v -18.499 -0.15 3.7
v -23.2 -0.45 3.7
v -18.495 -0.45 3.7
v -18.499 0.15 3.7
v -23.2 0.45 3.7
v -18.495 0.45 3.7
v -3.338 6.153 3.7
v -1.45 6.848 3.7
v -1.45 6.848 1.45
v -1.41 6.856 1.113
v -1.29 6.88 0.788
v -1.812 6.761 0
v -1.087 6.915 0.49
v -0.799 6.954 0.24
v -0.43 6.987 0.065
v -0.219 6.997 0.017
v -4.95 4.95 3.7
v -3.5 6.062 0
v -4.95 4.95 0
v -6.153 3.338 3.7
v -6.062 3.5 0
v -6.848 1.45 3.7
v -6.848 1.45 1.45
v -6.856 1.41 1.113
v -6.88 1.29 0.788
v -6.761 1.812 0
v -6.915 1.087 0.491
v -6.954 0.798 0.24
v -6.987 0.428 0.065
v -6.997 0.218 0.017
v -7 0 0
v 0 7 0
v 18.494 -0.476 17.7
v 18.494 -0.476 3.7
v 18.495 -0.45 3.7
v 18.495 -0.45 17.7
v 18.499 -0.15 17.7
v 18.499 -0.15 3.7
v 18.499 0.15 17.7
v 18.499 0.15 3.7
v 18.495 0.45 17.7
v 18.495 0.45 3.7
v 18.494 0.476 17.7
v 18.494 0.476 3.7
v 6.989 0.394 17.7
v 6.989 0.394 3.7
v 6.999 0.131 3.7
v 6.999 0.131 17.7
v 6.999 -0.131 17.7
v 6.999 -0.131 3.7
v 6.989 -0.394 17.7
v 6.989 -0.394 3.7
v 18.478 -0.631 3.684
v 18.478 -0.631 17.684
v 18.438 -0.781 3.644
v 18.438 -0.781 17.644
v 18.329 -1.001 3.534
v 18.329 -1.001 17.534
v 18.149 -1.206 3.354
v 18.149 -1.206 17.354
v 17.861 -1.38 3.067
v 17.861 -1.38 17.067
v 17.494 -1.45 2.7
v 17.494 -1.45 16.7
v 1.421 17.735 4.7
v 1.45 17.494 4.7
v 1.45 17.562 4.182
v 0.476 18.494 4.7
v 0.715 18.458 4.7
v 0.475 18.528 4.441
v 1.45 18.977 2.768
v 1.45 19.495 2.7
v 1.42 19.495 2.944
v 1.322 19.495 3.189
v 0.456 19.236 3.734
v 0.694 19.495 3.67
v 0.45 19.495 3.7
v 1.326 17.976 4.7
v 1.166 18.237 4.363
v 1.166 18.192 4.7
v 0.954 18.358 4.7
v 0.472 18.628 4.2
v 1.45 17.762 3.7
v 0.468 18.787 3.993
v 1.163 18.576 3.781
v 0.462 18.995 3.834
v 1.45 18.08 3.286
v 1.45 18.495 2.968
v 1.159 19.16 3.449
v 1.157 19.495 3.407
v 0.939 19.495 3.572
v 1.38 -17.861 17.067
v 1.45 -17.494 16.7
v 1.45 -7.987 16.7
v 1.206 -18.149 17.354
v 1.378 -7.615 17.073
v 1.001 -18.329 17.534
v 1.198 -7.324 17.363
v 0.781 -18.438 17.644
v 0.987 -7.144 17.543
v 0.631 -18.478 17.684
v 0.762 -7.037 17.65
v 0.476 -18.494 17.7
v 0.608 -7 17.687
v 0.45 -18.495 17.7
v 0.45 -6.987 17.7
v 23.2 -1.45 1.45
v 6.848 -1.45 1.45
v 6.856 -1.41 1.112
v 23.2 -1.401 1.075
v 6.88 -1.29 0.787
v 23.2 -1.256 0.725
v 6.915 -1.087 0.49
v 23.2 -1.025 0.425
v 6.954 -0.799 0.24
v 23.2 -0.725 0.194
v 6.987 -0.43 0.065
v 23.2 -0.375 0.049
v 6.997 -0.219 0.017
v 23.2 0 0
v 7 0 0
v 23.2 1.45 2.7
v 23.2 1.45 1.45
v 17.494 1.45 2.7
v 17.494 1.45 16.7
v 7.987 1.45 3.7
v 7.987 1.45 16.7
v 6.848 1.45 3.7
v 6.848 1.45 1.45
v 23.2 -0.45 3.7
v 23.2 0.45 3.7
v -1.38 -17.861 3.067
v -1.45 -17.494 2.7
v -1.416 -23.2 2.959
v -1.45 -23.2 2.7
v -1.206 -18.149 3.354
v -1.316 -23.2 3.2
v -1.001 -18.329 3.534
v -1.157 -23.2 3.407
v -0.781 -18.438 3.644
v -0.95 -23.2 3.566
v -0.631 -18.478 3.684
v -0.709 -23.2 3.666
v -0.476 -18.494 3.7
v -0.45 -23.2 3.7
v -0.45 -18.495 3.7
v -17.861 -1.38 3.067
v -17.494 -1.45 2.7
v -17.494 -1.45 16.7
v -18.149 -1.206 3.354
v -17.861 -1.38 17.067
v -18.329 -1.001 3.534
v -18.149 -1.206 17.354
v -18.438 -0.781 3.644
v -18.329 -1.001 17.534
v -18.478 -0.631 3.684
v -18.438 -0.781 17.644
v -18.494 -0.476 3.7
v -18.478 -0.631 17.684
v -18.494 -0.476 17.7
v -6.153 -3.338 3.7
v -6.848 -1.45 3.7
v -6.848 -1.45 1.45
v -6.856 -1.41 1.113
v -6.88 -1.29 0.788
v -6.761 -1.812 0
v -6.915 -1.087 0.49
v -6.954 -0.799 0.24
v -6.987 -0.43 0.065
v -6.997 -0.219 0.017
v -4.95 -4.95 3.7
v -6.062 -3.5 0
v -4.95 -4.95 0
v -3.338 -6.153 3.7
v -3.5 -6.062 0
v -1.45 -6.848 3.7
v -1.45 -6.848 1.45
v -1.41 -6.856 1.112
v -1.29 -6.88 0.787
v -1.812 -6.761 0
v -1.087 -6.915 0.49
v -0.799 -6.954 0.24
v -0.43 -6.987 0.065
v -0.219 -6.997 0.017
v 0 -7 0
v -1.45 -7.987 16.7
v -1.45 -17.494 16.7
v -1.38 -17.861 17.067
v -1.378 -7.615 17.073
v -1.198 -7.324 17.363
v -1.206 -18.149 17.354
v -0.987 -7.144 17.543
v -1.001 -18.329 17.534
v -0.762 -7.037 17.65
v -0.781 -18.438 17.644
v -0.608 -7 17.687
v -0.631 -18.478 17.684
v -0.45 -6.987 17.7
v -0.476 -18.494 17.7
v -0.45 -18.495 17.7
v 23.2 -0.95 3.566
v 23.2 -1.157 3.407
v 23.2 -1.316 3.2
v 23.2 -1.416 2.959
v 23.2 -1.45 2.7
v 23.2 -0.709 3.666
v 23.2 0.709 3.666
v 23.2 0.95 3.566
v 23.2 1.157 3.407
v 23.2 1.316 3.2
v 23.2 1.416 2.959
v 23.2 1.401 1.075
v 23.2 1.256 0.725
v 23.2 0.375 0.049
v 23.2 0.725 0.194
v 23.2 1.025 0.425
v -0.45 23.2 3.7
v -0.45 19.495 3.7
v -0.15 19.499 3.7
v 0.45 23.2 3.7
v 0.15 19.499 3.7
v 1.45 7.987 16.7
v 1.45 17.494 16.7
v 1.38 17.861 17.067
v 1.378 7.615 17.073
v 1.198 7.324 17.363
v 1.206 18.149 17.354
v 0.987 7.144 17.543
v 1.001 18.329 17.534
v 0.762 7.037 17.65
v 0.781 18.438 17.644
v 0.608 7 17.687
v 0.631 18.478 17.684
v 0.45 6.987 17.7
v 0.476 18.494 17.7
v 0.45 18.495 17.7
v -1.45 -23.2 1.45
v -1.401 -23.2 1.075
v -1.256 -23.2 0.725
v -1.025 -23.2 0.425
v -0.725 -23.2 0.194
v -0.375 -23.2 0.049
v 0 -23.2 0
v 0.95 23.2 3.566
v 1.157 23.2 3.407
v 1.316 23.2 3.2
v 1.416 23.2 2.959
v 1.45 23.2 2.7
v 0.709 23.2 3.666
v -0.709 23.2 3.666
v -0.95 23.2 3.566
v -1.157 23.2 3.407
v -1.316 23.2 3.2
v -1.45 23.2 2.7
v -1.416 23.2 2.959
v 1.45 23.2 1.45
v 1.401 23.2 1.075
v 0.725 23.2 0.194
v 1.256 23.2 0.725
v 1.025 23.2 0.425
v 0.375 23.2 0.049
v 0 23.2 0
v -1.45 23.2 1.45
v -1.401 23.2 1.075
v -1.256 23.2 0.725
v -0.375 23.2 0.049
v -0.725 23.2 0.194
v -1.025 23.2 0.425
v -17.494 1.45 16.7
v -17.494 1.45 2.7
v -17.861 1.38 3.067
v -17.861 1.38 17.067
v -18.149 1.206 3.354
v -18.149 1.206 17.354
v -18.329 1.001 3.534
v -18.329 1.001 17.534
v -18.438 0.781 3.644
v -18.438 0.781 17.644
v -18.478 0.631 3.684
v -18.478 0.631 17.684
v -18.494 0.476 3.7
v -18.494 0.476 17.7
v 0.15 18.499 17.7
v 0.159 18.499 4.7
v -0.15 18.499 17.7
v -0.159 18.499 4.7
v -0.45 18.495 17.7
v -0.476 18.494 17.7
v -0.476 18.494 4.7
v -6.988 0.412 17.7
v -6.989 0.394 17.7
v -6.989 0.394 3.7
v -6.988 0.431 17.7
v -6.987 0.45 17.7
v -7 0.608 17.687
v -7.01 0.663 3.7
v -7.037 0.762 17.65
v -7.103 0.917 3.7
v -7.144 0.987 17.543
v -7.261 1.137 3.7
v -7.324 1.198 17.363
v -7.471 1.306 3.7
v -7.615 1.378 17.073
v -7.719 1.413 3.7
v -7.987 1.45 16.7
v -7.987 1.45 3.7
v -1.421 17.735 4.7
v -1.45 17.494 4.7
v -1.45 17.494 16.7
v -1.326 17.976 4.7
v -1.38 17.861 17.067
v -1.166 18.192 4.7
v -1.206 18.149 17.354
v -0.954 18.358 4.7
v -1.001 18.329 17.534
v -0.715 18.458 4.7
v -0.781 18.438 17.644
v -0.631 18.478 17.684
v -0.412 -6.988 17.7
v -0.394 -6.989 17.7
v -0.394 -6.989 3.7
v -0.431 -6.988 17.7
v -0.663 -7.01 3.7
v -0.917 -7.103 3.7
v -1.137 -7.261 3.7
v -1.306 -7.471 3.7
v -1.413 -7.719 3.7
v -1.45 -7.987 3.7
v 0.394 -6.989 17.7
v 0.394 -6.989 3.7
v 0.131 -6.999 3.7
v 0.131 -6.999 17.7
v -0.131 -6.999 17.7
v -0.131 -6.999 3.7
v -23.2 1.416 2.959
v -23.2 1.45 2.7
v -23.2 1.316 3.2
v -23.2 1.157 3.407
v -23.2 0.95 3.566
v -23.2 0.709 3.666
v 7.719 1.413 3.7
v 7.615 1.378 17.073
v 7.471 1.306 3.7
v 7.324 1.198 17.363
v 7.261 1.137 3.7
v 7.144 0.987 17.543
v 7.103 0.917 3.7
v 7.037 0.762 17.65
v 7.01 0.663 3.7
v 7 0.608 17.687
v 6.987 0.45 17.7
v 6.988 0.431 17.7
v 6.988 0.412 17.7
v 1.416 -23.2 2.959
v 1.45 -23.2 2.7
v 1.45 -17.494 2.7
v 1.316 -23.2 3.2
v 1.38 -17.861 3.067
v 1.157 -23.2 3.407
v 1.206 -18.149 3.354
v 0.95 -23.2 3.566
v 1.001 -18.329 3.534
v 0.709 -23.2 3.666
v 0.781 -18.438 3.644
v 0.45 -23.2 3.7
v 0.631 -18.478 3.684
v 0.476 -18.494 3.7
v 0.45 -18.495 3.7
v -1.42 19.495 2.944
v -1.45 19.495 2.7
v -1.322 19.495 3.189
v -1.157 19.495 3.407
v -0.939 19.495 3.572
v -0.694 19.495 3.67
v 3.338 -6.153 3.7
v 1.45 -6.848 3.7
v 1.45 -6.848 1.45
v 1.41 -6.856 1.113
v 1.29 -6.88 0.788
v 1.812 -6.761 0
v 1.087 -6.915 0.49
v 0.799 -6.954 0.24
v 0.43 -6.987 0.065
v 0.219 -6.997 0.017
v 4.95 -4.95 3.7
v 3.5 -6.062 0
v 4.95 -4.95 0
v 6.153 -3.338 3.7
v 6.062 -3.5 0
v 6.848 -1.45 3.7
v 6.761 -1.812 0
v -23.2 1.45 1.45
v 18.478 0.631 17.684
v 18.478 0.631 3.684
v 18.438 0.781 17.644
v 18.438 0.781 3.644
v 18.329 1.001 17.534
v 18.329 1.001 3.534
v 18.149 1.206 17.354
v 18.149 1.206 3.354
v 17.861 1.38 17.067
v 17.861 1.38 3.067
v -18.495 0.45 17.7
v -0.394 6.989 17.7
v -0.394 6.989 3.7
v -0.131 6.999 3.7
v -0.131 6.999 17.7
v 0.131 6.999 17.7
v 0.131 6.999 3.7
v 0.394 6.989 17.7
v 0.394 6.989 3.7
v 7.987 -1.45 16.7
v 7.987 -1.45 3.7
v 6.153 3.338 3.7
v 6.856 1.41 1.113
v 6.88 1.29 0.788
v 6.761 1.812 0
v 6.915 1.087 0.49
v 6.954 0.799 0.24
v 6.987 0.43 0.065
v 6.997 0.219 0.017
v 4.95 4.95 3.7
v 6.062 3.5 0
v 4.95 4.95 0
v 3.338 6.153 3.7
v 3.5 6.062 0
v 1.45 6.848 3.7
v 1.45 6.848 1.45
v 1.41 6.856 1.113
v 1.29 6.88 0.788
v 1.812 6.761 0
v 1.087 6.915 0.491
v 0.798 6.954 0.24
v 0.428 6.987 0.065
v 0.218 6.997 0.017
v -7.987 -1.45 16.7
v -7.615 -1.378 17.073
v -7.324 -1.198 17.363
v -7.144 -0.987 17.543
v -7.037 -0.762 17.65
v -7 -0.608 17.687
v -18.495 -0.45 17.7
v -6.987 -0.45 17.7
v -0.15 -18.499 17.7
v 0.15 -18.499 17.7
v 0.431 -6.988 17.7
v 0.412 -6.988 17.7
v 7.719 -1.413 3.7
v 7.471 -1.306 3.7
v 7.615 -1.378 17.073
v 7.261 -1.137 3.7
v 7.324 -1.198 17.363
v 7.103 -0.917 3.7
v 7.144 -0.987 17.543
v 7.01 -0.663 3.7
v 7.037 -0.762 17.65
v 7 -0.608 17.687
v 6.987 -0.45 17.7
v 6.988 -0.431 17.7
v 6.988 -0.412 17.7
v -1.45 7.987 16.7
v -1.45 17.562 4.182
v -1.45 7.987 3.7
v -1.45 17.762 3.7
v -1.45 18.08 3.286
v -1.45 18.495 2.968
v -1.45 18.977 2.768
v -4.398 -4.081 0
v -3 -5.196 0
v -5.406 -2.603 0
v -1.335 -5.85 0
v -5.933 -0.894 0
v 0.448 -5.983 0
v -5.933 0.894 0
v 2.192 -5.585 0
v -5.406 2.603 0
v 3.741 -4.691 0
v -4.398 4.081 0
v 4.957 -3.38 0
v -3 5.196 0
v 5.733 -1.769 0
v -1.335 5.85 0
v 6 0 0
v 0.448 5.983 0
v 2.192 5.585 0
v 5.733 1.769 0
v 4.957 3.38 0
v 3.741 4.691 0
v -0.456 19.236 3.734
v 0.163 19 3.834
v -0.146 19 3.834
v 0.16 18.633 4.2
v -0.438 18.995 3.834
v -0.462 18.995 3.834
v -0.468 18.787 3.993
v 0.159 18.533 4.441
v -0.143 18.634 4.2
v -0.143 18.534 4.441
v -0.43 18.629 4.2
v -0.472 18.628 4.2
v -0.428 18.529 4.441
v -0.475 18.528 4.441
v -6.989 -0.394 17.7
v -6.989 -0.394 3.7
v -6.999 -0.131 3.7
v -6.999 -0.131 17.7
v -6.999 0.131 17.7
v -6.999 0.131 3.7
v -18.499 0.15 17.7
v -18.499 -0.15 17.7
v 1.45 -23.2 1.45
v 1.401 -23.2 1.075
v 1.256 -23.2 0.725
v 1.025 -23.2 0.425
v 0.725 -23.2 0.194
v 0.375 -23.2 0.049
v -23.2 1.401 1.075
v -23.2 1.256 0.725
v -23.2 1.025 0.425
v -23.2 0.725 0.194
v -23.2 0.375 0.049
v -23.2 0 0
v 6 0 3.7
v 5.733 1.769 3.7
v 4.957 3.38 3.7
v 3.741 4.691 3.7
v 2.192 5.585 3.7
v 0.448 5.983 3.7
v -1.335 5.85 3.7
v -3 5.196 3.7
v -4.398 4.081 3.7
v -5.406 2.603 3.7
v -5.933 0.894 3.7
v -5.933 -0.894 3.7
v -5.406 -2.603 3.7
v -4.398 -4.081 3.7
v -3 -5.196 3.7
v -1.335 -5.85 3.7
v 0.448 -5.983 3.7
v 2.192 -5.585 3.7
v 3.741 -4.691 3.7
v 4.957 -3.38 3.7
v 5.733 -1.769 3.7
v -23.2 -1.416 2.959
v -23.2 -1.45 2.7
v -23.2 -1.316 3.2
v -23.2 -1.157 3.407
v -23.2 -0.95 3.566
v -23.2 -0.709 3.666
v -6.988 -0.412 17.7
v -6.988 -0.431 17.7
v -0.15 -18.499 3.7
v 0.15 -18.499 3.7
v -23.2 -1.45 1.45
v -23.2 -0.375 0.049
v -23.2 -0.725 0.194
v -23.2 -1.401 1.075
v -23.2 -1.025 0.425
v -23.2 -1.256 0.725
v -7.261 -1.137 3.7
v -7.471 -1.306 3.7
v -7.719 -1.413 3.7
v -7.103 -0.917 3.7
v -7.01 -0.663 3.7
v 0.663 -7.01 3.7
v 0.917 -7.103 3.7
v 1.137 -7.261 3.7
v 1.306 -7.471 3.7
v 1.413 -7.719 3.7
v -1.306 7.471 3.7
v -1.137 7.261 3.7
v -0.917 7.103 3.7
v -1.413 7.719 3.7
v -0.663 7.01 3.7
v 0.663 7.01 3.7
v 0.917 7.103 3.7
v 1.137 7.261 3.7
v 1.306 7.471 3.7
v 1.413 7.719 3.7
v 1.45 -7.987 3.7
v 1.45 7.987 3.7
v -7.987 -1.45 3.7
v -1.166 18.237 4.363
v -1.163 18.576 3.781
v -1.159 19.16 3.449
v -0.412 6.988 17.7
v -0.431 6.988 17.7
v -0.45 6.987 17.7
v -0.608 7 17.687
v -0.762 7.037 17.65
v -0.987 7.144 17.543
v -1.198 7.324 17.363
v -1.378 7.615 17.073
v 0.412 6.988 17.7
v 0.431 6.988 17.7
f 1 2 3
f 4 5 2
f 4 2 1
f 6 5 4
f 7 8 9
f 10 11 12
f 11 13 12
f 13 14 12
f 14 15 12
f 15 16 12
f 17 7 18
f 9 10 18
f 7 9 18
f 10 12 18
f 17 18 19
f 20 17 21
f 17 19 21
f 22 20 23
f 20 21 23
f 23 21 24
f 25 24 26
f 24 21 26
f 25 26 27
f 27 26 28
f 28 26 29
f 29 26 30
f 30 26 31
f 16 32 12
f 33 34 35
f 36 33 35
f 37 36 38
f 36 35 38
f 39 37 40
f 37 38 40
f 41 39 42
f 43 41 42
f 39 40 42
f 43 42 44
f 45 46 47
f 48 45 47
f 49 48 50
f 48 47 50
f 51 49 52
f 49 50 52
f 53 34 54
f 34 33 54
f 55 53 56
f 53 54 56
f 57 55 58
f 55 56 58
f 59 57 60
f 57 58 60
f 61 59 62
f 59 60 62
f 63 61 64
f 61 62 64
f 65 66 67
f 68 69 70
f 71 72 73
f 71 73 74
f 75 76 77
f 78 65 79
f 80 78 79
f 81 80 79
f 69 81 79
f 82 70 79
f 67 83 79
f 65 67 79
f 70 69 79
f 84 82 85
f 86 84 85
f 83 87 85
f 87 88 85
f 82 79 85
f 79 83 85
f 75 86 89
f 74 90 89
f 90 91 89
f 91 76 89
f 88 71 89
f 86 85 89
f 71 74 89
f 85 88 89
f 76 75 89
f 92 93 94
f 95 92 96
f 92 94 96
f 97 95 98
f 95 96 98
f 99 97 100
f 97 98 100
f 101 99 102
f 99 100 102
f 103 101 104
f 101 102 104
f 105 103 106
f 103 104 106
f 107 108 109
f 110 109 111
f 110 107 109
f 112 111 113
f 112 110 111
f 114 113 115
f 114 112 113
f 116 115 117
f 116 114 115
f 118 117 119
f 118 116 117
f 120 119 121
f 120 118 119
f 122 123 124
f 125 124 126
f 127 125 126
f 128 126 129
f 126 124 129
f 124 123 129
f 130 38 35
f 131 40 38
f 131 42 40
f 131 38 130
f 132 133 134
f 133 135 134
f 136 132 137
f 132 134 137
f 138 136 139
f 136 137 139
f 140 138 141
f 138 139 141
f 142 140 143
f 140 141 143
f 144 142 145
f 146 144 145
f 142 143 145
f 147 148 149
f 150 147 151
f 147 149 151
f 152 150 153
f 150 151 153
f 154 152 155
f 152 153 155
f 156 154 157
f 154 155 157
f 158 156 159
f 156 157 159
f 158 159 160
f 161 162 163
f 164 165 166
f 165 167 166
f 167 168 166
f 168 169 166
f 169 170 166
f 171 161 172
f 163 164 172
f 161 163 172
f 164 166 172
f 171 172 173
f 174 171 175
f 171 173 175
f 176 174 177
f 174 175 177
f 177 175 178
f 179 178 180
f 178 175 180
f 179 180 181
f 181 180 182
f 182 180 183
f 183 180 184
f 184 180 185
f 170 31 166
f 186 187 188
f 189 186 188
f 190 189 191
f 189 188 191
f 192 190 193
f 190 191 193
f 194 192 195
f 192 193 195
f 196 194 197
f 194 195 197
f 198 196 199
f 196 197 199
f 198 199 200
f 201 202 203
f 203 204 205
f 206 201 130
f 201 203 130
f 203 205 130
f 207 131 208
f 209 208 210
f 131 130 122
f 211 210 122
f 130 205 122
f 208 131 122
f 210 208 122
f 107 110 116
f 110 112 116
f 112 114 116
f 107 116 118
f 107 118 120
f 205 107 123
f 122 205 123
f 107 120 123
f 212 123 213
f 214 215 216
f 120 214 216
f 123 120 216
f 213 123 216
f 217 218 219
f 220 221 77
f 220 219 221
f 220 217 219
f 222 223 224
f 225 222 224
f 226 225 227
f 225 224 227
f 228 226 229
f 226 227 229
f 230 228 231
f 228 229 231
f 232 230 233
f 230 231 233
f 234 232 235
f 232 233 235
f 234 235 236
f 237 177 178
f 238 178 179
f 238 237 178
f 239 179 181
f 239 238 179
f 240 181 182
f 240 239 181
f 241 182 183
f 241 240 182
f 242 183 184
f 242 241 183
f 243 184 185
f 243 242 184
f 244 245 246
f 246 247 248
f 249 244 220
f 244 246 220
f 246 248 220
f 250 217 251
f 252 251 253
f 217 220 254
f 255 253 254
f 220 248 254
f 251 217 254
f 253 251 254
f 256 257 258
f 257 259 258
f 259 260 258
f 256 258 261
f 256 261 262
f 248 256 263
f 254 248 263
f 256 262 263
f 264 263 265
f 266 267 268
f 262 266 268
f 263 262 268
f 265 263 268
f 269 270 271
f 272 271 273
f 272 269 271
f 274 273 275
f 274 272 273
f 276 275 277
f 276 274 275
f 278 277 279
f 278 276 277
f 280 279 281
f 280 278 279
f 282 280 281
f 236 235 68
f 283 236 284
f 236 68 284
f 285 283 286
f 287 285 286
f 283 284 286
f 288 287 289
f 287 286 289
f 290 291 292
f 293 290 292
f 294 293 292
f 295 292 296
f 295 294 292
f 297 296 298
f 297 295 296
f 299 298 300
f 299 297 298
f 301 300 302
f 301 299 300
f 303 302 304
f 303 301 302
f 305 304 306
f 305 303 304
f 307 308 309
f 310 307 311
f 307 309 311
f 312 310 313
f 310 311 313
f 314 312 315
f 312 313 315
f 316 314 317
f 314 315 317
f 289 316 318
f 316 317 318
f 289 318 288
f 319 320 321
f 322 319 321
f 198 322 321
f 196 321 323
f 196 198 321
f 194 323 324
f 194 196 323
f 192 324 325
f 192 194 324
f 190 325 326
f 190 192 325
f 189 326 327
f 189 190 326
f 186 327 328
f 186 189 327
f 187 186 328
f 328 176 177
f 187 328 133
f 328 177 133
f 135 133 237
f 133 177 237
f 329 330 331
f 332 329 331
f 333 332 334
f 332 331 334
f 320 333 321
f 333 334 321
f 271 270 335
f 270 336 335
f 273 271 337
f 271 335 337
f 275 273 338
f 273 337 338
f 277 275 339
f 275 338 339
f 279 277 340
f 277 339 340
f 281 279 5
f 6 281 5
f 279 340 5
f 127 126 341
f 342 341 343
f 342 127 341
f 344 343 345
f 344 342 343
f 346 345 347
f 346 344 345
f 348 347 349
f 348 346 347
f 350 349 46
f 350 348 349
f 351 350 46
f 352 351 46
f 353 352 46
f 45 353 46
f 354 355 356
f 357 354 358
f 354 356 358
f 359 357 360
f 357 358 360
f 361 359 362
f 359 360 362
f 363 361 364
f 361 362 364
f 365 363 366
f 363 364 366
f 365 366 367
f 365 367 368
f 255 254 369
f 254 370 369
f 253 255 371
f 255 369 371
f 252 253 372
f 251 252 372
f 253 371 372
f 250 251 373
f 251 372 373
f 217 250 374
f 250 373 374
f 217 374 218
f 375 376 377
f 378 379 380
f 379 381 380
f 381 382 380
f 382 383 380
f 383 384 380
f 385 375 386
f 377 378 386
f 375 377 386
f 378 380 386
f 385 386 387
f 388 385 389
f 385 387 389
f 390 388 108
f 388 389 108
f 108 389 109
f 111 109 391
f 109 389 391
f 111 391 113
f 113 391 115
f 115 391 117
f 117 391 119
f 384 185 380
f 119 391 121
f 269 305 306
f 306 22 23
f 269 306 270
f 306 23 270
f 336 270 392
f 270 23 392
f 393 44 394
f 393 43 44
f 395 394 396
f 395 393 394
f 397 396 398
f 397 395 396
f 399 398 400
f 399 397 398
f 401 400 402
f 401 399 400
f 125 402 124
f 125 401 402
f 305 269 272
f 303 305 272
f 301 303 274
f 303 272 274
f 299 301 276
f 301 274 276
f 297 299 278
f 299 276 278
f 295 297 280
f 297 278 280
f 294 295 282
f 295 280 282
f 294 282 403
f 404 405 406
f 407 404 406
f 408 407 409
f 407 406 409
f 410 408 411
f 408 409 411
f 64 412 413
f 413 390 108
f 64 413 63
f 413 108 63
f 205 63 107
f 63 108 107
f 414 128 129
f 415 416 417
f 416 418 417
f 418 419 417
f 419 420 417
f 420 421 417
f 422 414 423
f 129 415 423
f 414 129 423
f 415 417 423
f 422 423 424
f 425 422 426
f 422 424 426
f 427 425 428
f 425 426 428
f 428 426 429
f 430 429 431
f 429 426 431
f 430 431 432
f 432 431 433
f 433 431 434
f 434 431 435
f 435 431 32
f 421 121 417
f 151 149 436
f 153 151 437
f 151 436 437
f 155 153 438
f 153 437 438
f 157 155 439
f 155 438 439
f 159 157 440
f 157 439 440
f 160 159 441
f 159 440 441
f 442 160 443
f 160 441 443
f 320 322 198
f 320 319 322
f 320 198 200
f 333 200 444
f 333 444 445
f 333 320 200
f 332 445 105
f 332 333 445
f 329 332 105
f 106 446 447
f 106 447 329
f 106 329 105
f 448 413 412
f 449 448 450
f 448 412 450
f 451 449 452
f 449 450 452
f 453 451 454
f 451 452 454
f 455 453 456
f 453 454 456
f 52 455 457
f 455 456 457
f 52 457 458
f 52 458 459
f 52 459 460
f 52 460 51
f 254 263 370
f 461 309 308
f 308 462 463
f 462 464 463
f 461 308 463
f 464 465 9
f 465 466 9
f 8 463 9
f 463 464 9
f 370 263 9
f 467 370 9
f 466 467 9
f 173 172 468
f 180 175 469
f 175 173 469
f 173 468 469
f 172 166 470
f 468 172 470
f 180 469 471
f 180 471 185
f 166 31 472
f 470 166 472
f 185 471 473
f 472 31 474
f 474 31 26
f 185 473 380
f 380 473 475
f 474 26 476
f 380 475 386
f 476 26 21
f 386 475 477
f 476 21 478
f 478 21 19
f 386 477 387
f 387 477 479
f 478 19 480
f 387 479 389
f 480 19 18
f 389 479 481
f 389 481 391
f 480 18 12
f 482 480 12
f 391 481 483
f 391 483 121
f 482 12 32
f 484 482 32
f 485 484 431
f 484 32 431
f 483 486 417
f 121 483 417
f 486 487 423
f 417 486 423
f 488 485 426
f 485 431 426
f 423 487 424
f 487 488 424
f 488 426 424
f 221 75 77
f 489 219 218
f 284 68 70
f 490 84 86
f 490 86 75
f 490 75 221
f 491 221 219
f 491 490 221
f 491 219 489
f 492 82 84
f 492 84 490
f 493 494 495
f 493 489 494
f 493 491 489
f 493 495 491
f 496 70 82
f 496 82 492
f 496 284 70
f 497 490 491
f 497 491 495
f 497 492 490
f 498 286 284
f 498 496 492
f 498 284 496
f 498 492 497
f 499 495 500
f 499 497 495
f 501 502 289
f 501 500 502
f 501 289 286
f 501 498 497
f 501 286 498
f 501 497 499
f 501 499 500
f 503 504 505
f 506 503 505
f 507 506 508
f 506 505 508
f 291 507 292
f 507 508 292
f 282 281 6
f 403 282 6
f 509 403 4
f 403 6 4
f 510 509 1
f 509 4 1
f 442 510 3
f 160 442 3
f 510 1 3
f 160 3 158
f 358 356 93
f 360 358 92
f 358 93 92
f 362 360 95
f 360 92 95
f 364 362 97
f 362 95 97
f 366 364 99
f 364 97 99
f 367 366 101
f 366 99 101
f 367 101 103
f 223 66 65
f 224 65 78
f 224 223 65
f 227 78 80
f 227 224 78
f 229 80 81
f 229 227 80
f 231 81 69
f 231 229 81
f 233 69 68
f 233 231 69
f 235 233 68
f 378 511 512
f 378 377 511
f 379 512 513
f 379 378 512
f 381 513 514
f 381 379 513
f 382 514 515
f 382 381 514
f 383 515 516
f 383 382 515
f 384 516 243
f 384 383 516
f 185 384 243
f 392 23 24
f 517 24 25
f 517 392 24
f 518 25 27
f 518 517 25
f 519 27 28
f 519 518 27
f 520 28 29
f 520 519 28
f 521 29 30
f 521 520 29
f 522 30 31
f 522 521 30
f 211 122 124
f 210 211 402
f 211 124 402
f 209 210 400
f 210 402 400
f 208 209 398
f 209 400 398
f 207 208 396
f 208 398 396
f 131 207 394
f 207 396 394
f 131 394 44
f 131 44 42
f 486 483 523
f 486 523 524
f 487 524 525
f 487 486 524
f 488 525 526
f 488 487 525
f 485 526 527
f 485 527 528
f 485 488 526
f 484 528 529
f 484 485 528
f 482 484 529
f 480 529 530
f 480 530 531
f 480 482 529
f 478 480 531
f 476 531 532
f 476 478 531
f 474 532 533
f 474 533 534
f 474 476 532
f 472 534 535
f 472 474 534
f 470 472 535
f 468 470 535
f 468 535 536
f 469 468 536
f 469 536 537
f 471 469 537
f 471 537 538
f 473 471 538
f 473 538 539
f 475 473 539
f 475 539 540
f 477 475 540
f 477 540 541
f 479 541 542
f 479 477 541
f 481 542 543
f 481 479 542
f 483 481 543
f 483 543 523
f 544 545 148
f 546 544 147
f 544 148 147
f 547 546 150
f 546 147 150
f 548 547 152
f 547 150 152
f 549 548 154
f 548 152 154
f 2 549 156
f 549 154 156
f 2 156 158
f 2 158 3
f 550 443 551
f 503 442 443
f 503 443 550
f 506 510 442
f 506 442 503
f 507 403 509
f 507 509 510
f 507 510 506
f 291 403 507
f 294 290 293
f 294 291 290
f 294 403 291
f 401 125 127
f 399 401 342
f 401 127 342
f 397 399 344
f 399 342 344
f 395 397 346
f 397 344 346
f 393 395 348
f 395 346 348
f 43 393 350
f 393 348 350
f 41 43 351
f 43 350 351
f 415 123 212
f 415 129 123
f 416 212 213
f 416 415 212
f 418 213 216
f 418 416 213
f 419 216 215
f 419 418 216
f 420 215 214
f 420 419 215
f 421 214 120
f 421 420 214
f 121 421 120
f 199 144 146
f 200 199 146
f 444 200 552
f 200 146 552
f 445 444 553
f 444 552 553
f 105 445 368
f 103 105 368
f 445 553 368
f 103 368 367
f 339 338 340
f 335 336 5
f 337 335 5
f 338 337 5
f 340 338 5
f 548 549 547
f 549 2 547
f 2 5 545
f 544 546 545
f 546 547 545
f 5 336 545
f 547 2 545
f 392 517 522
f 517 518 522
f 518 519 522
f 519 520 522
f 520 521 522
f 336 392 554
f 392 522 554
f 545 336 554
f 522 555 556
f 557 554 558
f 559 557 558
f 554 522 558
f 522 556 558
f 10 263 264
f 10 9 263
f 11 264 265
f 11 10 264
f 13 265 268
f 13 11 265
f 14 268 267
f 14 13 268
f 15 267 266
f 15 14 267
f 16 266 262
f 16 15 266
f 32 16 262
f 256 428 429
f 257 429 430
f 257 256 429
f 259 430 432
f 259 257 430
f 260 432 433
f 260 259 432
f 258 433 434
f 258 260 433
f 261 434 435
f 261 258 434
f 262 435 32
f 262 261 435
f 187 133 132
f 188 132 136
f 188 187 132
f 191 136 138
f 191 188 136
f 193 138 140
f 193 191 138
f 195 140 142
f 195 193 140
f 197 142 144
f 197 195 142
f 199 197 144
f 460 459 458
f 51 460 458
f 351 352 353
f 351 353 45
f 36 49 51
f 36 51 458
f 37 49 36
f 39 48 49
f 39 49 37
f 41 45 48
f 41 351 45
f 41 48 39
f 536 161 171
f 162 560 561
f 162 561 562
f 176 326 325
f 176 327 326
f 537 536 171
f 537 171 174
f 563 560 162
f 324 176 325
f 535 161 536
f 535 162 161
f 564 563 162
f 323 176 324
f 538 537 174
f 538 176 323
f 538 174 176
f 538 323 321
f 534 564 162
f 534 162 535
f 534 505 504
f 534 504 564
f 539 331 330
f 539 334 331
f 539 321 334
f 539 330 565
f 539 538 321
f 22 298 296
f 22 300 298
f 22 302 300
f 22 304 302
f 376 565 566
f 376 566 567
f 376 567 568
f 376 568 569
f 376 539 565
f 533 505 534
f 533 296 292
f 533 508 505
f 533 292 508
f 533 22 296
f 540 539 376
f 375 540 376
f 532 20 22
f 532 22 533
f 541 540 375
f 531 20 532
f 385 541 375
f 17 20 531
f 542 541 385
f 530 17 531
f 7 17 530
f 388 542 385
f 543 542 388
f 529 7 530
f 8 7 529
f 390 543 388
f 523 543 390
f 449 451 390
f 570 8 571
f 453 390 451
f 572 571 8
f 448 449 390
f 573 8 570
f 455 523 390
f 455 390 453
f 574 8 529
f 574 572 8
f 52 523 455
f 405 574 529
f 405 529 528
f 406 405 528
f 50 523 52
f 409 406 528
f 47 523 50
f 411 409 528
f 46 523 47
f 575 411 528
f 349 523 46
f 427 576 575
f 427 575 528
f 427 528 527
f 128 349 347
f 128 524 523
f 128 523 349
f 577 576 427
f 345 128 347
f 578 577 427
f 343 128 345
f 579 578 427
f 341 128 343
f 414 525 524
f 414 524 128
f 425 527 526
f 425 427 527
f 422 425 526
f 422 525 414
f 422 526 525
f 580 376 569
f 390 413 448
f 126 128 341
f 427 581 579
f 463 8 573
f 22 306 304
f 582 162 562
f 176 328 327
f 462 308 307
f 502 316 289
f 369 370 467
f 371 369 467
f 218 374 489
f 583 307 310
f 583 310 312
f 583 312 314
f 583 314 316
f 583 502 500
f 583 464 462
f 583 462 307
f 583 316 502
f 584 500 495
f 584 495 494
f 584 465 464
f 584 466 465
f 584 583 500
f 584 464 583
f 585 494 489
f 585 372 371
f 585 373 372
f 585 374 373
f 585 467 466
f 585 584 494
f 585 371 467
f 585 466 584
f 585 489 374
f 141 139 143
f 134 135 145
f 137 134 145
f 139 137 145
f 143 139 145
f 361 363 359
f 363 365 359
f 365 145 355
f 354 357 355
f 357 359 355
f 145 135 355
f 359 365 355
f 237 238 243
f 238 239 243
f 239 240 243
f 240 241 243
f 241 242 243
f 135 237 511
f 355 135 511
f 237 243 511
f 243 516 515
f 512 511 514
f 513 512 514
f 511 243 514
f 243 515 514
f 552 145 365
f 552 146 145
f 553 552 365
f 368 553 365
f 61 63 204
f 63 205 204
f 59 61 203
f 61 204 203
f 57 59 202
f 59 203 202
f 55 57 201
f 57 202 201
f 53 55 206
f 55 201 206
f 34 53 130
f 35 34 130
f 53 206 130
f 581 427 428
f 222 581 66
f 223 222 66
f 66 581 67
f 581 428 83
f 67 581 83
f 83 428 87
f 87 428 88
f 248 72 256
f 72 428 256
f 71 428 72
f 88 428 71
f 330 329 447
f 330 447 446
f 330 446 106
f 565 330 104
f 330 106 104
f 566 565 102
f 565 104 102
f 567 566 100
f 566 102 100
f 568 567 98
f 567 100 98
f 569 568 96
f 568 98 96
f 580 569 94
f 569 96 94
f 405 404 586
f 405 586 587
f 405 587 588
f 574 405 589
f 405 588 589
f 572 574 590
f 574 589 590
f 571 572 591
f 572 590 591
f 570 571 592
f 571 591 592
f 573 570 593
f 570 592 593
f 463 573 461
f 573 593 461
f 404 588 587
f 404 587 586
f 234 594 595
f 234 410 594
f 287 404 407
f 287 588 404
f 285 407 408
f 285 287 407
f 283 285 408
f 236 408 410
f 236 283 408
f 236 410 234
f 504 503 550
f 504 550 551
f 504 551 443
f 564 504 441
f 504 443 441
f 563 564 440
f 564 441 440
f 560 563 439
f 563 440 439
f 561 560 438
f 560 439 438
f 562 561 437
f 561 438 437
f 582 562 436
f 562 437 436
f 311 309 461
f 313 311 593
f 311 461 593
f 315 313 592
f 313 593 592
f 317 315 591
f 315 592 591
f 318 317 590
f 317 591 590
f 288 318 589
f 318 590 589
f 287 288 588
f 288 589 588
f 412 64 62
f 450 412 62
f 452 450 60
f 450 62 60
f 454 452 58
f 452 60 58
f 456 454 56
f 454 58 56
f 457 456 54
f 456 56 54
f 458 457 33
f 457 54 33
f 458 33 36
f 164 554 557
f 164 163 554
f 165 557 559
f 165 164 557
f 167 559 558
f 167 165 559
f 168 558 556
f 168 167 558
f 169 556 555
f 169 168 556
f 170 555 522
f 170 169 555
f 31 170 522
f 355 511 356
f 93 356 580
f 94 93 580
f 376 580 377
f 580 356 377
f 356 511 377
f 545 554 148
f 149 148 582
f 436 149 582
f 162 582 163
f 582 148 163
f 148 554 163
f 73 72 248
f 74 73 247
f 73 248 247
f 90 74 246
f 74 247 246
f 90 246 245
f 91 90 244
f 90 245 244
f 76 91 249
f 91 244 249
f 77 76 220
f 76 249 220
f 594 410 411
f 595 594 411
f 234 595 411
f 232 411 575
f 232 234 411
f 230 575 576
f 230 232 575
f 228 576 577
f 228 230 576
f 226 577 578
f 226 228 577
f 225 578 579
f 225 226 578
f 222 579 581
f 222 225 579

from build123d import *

# Parameters (mm, degrees)
F0_R     = 6
F1_DEPTH = 3.7
F2_R     = 1.44999
F4_DEPTH = 14
F5_R     = 1


# Not quite as in the source:
# - a fillet or chamfer is up to 0.001 mm smaller than in the source, because OpenCascade refuses the exact size


with BuildPart() as f1:
    # F0 (on Top) → F1 (new body)
    with BuildSketch(Plane.XY):
        with BuildLine():
            ThreePointArc((6.8481749394, -1.45), (6.9619402675, -0.7289634506), (7, 0))
            ThreePointArc((7, 0), (6.9619402675, 0.7289634506), (6.8481749394, 1.45))
            ThreePointArc((6.8481749394, 1.45), (4.9497474683, 4.9497474683), (1.45, 6.8481749394))
            ThreePointArc((1.45, 6.8481749394), (0.7289634506, 6.9619402675), (0, 7))
            ThreePointArc((0, 7), (-0.7289634506, 6.9619402675), (-1.45, 6.8481749394))
            ThreePointArc((-1.45, 6.8481749394), (-4.9497474683, 4.9497474683), (-6.8481749394, 1.45))
            ThreePointArc((-6.8481749394, 1.45), (-6.9619402675, 0.7289634506), (-7, 0))
            ThreePointArc((-7, 0), (-6.9619402675, -0.7289634506), (-6.8481749394, -1.45))
            ThreePointArc((-6.8481749394, -1.45), (-4.9497474683, -4.9497474683), (-1.45, -6.8481749394))
            ThreePointArc((-1.45, -6.8481749394), (-0.7289634506, -6.9619402675), (0, -7))
            ThreePointArc((0, -7), (0.7289634506, -6.9619402675), (1.45, -6.8481749394))
            ThreePointArc((1.45, -6.8481749394), (4.9497474683, -4.9497474683), (6.8481749394, -1.45))
        make_face()
        Circle(F0_R, mode=Mode.SUBTRACT)
        with BuildLine():
            Line((23.2, 0), (7, 0))
            ThreePointArc((7, 0), (6.9619402675, -0.7289634506), (6.8481749394, -1.45))
            Line((6.8481749394, -1.45), (23.2, -1.45))
            Line((23.2, -1.45), (23.2, 0))
        make_face()
        with BuildLine():
            ThreePointArc((6.8481749394, 1.45), (6.9619402675, 0.7289634506), (7, 0))
            Line((7, 0), (23.2, 0))
            Line((23.2, 0), (23.2, 1.45))
            Line((23.2, 1.45), (6.8481749394, 1.45))
        make_face()
        with BuildLine():
            ThreePointArc((0, 7), (0.7289634506, 6.9619402675), (1.45, 6.8481749394))
            Line((1.45, 6.8481749394), (1.45, 23.2))
            Line((1.45, 23.2), (0, 23.2))
            Line((0, 23.2), (0, 7))
        make_face()
        with BuildLine():
            Line((1.45, -23.2), (1.45, -6.8481749394))
            ThreePointArc((1.45, -6.8481749394), (0.7289634506, -6.9619402675), (0, -7))
            Line((0, -7), (0, -23.2))
            Line((0, -23.2), (1.45, -23.2))
        make_face()
        with BuildLine():
            ThreePointArc((-1.45, 6.8481749394), (-0.7289634506, 6.9619402675), (0, 7))
            Line((0, 7), (0, 23.2))
            Line((0, 23.2), (-1.45, 23.2))
            Line((-1.45, 23.2), (-1.45, 6.8481749394))
        make_face()
        with BuildLine():
            Line((0, -23.2), (0, -7))
            ThreePointArc((0, -7), (-0.7289634506, -6.9619402675), (-1.45, -6.8481749394))
            Line((-1.45, -6.8481749394), (-1.45, -23.2))
            Line((-1.45, -23.2), (0, -23.2))
        make_face()
        with BuildLine():
            ThreePointArc((-7, 0), (-6.9619402675, 0.7289634506), (-6.8481749394, 1.45))
            Line((-6.8481749394, 1.45), (-23.2, 1.45))
            Line((-23.2, 1.45), (-23.2, 0))
            Line((-23.2, 0), (-7, 0))
        make_face()
        with BuildLine():
            Line((-23.2, -1.45), (-6.8481749394, -1.45))
            ThreePointArc((-6.8481749394, -1.45), (-6.9619402675, -0.7289634506), (-7, 0))
            Line((-7, 0), (-23.2, 0))
            Line((-23.2, 0), (-23.2, -1.45))
        make_face()
    extrude(amount=F1_DEPTH)

    # F2 (radius 1.45 in the source; OpenCascade refuses exactly that, so slightly less here)
    f2_edges = [f1.edges().sort_by_distance(p)[0] for p in [
        (1.45, 15.024087, 0),
        (15.024087, 1.45, 0),
        (15.024087, -1.45, 0),
        (1.45, -15.024087, 0),
        (-1.45, -15.024087, 0),
        (-15.024087, -1.45, 0),
        (-15.024087, 1.45, 0),
        (-1.45, 15.024087, 0),
    ]]
    fillet(f2_edges, radius=F2_R)

    # F3 (on face) → F4 (join)
    with BuildSketch(Plane.XY.offset(3.7)):
        with BuildLine():
            Line((18.4430881362, 1.45), (18.4430881362, -1.45))
            ThreePointArc((18.4430881362, -1.45), (18.5, 0), (18.4430881362, 1.45))
        make_face()
        with BuildLine():
            Line((6.8481749394, -1.45), (18.4430881362, -1.45))
            Line((18.4430881362, -1.45), (18.4430881362, 1.45))
            Line((18.4430881362, 1.45), (6.8481749394, 1.45))
            ThreePointArc((6.8481749394, 1.45), (7, 0), (6.8481749394, -1.45))
        make_face()
        with BuildLine():
            ThreePointArc((-18.4430881362, 1.45), (-18.5, 0), (-18.4430881362, -1.45))
            Line((-18.4430881362, -1.45), (-18.4430881362, 1.45))
        make_face()
        with BuildLine():
            Line((-18.4430881362, 1.45), (-18.4430881362, -1.45))
            Line((-18.4430881362, -1.45), (-6.8481749394, -1.45))
            ThreePointArc((-6.8481749394, -1.45), (-7, 0), (-6.8481749394, 1.45))
            Line((-6.8481749394, 1.45), (-18.4430881362, 1.45))
        make_face()
        with BuildLine():
            ThreePointArc((-1.45, -18.4430881362), (0, -18.5), (1.45, -18.4430881362))
            Line((1.45, -18.4430881362), (-1.45, -18.4430881362))
        make_face()
        with BuildLine():
            Line((-1.45, -18.4430881362), (1.45, -18.4430881362))
            Line((1.45, -18.4430881362), (1.45, -6.8481749394))
            ThreePointArc((1.45, -6.8481749394), (0, -7), (-1.45, -6.8481749394))
            Line((-1.45, -6.8481749394), (-1.45, -18.4430881362))
        make_face()
        with BuildLine():
            Line((1.45, 6.8481749394), (1.45, 18.4430881362))
            Line((1.45, 18.4430881362), (-1.45, 18.4430881362))
            Line((-1.45, 18.4430881362), (-1.45, 6.8481749394))
            ThreePointArc((-1.45, 6.8481749394), (0, 7), (1.45, 6.8481749394))
        make_face()
        with BuildLine():
            Line((-1.45, 18.4430881362), (1.45, 18.4430881362))
            ThreePointArc((1.45, 18.4430881362), (0, 18.5), (-1.45, 18.4430881362))
        make_face()
    extrude(amount=F4_DEPTH)

    # F5
    f5_edges = [f1.edges().sort_by_distance(p)[0] for p in [
        (12.645632, 1.45, 17.7),
        (18.443088, 1.45, 10.7),
        (20.821544, 1.45, 3.7),
        (20.821544, -1.45, 3.7),
        (18.443088, -1.45, 10.7),
        (12.645632, -1.45, 17.7),
        (1.45, 12.645632, 17.7),
        (-1.45, 12.645632, 17.7),
        (1.45, 18.443088, 10.7),
        (-1.45, 18.443088, 10.7),
        (1.45, 20.821544, 3.7),
        (-1.45, 20.821544, 3.7),
        (0, 18.5, 3.7),
        (-18.443088, 1.45, 10.7),
        (-18.443088, -1.45, 10.7),
        (-20.821544, 1.45, 3.7),
        (-1.45, -18.443088, 10.7),
        (1.45, -18.443088, 10.7),
        (-1.45, -20.821544, 3.7),
        (1.45, -20.821544, 3.7),
        (-20.821544, -1.45, 3.7),
        (-12.645632, 1.45, 17.7),
        (-12.645632, -1.45, 17.7),
        (-1.45, -12.645632, 17.7),
        (1.45, -12.645632, 17.7),
        (-1.45, -6.848175, 10.7),
        (1.45, -6.848175, 10.7),
        (6.848175, -1.45, 10.7),
        (6.848175, 1.45, 10.7),
        (1.45, 6.848175, 10.7),
        (-1.45, 6.848175, 10.7),
        (-6.848175, 1.45, 10.7),
        (-6.848175, -1.45, 10.7),
    ]]
    fillet(f5_edges, radius=F5_R)


solid = f1.part
